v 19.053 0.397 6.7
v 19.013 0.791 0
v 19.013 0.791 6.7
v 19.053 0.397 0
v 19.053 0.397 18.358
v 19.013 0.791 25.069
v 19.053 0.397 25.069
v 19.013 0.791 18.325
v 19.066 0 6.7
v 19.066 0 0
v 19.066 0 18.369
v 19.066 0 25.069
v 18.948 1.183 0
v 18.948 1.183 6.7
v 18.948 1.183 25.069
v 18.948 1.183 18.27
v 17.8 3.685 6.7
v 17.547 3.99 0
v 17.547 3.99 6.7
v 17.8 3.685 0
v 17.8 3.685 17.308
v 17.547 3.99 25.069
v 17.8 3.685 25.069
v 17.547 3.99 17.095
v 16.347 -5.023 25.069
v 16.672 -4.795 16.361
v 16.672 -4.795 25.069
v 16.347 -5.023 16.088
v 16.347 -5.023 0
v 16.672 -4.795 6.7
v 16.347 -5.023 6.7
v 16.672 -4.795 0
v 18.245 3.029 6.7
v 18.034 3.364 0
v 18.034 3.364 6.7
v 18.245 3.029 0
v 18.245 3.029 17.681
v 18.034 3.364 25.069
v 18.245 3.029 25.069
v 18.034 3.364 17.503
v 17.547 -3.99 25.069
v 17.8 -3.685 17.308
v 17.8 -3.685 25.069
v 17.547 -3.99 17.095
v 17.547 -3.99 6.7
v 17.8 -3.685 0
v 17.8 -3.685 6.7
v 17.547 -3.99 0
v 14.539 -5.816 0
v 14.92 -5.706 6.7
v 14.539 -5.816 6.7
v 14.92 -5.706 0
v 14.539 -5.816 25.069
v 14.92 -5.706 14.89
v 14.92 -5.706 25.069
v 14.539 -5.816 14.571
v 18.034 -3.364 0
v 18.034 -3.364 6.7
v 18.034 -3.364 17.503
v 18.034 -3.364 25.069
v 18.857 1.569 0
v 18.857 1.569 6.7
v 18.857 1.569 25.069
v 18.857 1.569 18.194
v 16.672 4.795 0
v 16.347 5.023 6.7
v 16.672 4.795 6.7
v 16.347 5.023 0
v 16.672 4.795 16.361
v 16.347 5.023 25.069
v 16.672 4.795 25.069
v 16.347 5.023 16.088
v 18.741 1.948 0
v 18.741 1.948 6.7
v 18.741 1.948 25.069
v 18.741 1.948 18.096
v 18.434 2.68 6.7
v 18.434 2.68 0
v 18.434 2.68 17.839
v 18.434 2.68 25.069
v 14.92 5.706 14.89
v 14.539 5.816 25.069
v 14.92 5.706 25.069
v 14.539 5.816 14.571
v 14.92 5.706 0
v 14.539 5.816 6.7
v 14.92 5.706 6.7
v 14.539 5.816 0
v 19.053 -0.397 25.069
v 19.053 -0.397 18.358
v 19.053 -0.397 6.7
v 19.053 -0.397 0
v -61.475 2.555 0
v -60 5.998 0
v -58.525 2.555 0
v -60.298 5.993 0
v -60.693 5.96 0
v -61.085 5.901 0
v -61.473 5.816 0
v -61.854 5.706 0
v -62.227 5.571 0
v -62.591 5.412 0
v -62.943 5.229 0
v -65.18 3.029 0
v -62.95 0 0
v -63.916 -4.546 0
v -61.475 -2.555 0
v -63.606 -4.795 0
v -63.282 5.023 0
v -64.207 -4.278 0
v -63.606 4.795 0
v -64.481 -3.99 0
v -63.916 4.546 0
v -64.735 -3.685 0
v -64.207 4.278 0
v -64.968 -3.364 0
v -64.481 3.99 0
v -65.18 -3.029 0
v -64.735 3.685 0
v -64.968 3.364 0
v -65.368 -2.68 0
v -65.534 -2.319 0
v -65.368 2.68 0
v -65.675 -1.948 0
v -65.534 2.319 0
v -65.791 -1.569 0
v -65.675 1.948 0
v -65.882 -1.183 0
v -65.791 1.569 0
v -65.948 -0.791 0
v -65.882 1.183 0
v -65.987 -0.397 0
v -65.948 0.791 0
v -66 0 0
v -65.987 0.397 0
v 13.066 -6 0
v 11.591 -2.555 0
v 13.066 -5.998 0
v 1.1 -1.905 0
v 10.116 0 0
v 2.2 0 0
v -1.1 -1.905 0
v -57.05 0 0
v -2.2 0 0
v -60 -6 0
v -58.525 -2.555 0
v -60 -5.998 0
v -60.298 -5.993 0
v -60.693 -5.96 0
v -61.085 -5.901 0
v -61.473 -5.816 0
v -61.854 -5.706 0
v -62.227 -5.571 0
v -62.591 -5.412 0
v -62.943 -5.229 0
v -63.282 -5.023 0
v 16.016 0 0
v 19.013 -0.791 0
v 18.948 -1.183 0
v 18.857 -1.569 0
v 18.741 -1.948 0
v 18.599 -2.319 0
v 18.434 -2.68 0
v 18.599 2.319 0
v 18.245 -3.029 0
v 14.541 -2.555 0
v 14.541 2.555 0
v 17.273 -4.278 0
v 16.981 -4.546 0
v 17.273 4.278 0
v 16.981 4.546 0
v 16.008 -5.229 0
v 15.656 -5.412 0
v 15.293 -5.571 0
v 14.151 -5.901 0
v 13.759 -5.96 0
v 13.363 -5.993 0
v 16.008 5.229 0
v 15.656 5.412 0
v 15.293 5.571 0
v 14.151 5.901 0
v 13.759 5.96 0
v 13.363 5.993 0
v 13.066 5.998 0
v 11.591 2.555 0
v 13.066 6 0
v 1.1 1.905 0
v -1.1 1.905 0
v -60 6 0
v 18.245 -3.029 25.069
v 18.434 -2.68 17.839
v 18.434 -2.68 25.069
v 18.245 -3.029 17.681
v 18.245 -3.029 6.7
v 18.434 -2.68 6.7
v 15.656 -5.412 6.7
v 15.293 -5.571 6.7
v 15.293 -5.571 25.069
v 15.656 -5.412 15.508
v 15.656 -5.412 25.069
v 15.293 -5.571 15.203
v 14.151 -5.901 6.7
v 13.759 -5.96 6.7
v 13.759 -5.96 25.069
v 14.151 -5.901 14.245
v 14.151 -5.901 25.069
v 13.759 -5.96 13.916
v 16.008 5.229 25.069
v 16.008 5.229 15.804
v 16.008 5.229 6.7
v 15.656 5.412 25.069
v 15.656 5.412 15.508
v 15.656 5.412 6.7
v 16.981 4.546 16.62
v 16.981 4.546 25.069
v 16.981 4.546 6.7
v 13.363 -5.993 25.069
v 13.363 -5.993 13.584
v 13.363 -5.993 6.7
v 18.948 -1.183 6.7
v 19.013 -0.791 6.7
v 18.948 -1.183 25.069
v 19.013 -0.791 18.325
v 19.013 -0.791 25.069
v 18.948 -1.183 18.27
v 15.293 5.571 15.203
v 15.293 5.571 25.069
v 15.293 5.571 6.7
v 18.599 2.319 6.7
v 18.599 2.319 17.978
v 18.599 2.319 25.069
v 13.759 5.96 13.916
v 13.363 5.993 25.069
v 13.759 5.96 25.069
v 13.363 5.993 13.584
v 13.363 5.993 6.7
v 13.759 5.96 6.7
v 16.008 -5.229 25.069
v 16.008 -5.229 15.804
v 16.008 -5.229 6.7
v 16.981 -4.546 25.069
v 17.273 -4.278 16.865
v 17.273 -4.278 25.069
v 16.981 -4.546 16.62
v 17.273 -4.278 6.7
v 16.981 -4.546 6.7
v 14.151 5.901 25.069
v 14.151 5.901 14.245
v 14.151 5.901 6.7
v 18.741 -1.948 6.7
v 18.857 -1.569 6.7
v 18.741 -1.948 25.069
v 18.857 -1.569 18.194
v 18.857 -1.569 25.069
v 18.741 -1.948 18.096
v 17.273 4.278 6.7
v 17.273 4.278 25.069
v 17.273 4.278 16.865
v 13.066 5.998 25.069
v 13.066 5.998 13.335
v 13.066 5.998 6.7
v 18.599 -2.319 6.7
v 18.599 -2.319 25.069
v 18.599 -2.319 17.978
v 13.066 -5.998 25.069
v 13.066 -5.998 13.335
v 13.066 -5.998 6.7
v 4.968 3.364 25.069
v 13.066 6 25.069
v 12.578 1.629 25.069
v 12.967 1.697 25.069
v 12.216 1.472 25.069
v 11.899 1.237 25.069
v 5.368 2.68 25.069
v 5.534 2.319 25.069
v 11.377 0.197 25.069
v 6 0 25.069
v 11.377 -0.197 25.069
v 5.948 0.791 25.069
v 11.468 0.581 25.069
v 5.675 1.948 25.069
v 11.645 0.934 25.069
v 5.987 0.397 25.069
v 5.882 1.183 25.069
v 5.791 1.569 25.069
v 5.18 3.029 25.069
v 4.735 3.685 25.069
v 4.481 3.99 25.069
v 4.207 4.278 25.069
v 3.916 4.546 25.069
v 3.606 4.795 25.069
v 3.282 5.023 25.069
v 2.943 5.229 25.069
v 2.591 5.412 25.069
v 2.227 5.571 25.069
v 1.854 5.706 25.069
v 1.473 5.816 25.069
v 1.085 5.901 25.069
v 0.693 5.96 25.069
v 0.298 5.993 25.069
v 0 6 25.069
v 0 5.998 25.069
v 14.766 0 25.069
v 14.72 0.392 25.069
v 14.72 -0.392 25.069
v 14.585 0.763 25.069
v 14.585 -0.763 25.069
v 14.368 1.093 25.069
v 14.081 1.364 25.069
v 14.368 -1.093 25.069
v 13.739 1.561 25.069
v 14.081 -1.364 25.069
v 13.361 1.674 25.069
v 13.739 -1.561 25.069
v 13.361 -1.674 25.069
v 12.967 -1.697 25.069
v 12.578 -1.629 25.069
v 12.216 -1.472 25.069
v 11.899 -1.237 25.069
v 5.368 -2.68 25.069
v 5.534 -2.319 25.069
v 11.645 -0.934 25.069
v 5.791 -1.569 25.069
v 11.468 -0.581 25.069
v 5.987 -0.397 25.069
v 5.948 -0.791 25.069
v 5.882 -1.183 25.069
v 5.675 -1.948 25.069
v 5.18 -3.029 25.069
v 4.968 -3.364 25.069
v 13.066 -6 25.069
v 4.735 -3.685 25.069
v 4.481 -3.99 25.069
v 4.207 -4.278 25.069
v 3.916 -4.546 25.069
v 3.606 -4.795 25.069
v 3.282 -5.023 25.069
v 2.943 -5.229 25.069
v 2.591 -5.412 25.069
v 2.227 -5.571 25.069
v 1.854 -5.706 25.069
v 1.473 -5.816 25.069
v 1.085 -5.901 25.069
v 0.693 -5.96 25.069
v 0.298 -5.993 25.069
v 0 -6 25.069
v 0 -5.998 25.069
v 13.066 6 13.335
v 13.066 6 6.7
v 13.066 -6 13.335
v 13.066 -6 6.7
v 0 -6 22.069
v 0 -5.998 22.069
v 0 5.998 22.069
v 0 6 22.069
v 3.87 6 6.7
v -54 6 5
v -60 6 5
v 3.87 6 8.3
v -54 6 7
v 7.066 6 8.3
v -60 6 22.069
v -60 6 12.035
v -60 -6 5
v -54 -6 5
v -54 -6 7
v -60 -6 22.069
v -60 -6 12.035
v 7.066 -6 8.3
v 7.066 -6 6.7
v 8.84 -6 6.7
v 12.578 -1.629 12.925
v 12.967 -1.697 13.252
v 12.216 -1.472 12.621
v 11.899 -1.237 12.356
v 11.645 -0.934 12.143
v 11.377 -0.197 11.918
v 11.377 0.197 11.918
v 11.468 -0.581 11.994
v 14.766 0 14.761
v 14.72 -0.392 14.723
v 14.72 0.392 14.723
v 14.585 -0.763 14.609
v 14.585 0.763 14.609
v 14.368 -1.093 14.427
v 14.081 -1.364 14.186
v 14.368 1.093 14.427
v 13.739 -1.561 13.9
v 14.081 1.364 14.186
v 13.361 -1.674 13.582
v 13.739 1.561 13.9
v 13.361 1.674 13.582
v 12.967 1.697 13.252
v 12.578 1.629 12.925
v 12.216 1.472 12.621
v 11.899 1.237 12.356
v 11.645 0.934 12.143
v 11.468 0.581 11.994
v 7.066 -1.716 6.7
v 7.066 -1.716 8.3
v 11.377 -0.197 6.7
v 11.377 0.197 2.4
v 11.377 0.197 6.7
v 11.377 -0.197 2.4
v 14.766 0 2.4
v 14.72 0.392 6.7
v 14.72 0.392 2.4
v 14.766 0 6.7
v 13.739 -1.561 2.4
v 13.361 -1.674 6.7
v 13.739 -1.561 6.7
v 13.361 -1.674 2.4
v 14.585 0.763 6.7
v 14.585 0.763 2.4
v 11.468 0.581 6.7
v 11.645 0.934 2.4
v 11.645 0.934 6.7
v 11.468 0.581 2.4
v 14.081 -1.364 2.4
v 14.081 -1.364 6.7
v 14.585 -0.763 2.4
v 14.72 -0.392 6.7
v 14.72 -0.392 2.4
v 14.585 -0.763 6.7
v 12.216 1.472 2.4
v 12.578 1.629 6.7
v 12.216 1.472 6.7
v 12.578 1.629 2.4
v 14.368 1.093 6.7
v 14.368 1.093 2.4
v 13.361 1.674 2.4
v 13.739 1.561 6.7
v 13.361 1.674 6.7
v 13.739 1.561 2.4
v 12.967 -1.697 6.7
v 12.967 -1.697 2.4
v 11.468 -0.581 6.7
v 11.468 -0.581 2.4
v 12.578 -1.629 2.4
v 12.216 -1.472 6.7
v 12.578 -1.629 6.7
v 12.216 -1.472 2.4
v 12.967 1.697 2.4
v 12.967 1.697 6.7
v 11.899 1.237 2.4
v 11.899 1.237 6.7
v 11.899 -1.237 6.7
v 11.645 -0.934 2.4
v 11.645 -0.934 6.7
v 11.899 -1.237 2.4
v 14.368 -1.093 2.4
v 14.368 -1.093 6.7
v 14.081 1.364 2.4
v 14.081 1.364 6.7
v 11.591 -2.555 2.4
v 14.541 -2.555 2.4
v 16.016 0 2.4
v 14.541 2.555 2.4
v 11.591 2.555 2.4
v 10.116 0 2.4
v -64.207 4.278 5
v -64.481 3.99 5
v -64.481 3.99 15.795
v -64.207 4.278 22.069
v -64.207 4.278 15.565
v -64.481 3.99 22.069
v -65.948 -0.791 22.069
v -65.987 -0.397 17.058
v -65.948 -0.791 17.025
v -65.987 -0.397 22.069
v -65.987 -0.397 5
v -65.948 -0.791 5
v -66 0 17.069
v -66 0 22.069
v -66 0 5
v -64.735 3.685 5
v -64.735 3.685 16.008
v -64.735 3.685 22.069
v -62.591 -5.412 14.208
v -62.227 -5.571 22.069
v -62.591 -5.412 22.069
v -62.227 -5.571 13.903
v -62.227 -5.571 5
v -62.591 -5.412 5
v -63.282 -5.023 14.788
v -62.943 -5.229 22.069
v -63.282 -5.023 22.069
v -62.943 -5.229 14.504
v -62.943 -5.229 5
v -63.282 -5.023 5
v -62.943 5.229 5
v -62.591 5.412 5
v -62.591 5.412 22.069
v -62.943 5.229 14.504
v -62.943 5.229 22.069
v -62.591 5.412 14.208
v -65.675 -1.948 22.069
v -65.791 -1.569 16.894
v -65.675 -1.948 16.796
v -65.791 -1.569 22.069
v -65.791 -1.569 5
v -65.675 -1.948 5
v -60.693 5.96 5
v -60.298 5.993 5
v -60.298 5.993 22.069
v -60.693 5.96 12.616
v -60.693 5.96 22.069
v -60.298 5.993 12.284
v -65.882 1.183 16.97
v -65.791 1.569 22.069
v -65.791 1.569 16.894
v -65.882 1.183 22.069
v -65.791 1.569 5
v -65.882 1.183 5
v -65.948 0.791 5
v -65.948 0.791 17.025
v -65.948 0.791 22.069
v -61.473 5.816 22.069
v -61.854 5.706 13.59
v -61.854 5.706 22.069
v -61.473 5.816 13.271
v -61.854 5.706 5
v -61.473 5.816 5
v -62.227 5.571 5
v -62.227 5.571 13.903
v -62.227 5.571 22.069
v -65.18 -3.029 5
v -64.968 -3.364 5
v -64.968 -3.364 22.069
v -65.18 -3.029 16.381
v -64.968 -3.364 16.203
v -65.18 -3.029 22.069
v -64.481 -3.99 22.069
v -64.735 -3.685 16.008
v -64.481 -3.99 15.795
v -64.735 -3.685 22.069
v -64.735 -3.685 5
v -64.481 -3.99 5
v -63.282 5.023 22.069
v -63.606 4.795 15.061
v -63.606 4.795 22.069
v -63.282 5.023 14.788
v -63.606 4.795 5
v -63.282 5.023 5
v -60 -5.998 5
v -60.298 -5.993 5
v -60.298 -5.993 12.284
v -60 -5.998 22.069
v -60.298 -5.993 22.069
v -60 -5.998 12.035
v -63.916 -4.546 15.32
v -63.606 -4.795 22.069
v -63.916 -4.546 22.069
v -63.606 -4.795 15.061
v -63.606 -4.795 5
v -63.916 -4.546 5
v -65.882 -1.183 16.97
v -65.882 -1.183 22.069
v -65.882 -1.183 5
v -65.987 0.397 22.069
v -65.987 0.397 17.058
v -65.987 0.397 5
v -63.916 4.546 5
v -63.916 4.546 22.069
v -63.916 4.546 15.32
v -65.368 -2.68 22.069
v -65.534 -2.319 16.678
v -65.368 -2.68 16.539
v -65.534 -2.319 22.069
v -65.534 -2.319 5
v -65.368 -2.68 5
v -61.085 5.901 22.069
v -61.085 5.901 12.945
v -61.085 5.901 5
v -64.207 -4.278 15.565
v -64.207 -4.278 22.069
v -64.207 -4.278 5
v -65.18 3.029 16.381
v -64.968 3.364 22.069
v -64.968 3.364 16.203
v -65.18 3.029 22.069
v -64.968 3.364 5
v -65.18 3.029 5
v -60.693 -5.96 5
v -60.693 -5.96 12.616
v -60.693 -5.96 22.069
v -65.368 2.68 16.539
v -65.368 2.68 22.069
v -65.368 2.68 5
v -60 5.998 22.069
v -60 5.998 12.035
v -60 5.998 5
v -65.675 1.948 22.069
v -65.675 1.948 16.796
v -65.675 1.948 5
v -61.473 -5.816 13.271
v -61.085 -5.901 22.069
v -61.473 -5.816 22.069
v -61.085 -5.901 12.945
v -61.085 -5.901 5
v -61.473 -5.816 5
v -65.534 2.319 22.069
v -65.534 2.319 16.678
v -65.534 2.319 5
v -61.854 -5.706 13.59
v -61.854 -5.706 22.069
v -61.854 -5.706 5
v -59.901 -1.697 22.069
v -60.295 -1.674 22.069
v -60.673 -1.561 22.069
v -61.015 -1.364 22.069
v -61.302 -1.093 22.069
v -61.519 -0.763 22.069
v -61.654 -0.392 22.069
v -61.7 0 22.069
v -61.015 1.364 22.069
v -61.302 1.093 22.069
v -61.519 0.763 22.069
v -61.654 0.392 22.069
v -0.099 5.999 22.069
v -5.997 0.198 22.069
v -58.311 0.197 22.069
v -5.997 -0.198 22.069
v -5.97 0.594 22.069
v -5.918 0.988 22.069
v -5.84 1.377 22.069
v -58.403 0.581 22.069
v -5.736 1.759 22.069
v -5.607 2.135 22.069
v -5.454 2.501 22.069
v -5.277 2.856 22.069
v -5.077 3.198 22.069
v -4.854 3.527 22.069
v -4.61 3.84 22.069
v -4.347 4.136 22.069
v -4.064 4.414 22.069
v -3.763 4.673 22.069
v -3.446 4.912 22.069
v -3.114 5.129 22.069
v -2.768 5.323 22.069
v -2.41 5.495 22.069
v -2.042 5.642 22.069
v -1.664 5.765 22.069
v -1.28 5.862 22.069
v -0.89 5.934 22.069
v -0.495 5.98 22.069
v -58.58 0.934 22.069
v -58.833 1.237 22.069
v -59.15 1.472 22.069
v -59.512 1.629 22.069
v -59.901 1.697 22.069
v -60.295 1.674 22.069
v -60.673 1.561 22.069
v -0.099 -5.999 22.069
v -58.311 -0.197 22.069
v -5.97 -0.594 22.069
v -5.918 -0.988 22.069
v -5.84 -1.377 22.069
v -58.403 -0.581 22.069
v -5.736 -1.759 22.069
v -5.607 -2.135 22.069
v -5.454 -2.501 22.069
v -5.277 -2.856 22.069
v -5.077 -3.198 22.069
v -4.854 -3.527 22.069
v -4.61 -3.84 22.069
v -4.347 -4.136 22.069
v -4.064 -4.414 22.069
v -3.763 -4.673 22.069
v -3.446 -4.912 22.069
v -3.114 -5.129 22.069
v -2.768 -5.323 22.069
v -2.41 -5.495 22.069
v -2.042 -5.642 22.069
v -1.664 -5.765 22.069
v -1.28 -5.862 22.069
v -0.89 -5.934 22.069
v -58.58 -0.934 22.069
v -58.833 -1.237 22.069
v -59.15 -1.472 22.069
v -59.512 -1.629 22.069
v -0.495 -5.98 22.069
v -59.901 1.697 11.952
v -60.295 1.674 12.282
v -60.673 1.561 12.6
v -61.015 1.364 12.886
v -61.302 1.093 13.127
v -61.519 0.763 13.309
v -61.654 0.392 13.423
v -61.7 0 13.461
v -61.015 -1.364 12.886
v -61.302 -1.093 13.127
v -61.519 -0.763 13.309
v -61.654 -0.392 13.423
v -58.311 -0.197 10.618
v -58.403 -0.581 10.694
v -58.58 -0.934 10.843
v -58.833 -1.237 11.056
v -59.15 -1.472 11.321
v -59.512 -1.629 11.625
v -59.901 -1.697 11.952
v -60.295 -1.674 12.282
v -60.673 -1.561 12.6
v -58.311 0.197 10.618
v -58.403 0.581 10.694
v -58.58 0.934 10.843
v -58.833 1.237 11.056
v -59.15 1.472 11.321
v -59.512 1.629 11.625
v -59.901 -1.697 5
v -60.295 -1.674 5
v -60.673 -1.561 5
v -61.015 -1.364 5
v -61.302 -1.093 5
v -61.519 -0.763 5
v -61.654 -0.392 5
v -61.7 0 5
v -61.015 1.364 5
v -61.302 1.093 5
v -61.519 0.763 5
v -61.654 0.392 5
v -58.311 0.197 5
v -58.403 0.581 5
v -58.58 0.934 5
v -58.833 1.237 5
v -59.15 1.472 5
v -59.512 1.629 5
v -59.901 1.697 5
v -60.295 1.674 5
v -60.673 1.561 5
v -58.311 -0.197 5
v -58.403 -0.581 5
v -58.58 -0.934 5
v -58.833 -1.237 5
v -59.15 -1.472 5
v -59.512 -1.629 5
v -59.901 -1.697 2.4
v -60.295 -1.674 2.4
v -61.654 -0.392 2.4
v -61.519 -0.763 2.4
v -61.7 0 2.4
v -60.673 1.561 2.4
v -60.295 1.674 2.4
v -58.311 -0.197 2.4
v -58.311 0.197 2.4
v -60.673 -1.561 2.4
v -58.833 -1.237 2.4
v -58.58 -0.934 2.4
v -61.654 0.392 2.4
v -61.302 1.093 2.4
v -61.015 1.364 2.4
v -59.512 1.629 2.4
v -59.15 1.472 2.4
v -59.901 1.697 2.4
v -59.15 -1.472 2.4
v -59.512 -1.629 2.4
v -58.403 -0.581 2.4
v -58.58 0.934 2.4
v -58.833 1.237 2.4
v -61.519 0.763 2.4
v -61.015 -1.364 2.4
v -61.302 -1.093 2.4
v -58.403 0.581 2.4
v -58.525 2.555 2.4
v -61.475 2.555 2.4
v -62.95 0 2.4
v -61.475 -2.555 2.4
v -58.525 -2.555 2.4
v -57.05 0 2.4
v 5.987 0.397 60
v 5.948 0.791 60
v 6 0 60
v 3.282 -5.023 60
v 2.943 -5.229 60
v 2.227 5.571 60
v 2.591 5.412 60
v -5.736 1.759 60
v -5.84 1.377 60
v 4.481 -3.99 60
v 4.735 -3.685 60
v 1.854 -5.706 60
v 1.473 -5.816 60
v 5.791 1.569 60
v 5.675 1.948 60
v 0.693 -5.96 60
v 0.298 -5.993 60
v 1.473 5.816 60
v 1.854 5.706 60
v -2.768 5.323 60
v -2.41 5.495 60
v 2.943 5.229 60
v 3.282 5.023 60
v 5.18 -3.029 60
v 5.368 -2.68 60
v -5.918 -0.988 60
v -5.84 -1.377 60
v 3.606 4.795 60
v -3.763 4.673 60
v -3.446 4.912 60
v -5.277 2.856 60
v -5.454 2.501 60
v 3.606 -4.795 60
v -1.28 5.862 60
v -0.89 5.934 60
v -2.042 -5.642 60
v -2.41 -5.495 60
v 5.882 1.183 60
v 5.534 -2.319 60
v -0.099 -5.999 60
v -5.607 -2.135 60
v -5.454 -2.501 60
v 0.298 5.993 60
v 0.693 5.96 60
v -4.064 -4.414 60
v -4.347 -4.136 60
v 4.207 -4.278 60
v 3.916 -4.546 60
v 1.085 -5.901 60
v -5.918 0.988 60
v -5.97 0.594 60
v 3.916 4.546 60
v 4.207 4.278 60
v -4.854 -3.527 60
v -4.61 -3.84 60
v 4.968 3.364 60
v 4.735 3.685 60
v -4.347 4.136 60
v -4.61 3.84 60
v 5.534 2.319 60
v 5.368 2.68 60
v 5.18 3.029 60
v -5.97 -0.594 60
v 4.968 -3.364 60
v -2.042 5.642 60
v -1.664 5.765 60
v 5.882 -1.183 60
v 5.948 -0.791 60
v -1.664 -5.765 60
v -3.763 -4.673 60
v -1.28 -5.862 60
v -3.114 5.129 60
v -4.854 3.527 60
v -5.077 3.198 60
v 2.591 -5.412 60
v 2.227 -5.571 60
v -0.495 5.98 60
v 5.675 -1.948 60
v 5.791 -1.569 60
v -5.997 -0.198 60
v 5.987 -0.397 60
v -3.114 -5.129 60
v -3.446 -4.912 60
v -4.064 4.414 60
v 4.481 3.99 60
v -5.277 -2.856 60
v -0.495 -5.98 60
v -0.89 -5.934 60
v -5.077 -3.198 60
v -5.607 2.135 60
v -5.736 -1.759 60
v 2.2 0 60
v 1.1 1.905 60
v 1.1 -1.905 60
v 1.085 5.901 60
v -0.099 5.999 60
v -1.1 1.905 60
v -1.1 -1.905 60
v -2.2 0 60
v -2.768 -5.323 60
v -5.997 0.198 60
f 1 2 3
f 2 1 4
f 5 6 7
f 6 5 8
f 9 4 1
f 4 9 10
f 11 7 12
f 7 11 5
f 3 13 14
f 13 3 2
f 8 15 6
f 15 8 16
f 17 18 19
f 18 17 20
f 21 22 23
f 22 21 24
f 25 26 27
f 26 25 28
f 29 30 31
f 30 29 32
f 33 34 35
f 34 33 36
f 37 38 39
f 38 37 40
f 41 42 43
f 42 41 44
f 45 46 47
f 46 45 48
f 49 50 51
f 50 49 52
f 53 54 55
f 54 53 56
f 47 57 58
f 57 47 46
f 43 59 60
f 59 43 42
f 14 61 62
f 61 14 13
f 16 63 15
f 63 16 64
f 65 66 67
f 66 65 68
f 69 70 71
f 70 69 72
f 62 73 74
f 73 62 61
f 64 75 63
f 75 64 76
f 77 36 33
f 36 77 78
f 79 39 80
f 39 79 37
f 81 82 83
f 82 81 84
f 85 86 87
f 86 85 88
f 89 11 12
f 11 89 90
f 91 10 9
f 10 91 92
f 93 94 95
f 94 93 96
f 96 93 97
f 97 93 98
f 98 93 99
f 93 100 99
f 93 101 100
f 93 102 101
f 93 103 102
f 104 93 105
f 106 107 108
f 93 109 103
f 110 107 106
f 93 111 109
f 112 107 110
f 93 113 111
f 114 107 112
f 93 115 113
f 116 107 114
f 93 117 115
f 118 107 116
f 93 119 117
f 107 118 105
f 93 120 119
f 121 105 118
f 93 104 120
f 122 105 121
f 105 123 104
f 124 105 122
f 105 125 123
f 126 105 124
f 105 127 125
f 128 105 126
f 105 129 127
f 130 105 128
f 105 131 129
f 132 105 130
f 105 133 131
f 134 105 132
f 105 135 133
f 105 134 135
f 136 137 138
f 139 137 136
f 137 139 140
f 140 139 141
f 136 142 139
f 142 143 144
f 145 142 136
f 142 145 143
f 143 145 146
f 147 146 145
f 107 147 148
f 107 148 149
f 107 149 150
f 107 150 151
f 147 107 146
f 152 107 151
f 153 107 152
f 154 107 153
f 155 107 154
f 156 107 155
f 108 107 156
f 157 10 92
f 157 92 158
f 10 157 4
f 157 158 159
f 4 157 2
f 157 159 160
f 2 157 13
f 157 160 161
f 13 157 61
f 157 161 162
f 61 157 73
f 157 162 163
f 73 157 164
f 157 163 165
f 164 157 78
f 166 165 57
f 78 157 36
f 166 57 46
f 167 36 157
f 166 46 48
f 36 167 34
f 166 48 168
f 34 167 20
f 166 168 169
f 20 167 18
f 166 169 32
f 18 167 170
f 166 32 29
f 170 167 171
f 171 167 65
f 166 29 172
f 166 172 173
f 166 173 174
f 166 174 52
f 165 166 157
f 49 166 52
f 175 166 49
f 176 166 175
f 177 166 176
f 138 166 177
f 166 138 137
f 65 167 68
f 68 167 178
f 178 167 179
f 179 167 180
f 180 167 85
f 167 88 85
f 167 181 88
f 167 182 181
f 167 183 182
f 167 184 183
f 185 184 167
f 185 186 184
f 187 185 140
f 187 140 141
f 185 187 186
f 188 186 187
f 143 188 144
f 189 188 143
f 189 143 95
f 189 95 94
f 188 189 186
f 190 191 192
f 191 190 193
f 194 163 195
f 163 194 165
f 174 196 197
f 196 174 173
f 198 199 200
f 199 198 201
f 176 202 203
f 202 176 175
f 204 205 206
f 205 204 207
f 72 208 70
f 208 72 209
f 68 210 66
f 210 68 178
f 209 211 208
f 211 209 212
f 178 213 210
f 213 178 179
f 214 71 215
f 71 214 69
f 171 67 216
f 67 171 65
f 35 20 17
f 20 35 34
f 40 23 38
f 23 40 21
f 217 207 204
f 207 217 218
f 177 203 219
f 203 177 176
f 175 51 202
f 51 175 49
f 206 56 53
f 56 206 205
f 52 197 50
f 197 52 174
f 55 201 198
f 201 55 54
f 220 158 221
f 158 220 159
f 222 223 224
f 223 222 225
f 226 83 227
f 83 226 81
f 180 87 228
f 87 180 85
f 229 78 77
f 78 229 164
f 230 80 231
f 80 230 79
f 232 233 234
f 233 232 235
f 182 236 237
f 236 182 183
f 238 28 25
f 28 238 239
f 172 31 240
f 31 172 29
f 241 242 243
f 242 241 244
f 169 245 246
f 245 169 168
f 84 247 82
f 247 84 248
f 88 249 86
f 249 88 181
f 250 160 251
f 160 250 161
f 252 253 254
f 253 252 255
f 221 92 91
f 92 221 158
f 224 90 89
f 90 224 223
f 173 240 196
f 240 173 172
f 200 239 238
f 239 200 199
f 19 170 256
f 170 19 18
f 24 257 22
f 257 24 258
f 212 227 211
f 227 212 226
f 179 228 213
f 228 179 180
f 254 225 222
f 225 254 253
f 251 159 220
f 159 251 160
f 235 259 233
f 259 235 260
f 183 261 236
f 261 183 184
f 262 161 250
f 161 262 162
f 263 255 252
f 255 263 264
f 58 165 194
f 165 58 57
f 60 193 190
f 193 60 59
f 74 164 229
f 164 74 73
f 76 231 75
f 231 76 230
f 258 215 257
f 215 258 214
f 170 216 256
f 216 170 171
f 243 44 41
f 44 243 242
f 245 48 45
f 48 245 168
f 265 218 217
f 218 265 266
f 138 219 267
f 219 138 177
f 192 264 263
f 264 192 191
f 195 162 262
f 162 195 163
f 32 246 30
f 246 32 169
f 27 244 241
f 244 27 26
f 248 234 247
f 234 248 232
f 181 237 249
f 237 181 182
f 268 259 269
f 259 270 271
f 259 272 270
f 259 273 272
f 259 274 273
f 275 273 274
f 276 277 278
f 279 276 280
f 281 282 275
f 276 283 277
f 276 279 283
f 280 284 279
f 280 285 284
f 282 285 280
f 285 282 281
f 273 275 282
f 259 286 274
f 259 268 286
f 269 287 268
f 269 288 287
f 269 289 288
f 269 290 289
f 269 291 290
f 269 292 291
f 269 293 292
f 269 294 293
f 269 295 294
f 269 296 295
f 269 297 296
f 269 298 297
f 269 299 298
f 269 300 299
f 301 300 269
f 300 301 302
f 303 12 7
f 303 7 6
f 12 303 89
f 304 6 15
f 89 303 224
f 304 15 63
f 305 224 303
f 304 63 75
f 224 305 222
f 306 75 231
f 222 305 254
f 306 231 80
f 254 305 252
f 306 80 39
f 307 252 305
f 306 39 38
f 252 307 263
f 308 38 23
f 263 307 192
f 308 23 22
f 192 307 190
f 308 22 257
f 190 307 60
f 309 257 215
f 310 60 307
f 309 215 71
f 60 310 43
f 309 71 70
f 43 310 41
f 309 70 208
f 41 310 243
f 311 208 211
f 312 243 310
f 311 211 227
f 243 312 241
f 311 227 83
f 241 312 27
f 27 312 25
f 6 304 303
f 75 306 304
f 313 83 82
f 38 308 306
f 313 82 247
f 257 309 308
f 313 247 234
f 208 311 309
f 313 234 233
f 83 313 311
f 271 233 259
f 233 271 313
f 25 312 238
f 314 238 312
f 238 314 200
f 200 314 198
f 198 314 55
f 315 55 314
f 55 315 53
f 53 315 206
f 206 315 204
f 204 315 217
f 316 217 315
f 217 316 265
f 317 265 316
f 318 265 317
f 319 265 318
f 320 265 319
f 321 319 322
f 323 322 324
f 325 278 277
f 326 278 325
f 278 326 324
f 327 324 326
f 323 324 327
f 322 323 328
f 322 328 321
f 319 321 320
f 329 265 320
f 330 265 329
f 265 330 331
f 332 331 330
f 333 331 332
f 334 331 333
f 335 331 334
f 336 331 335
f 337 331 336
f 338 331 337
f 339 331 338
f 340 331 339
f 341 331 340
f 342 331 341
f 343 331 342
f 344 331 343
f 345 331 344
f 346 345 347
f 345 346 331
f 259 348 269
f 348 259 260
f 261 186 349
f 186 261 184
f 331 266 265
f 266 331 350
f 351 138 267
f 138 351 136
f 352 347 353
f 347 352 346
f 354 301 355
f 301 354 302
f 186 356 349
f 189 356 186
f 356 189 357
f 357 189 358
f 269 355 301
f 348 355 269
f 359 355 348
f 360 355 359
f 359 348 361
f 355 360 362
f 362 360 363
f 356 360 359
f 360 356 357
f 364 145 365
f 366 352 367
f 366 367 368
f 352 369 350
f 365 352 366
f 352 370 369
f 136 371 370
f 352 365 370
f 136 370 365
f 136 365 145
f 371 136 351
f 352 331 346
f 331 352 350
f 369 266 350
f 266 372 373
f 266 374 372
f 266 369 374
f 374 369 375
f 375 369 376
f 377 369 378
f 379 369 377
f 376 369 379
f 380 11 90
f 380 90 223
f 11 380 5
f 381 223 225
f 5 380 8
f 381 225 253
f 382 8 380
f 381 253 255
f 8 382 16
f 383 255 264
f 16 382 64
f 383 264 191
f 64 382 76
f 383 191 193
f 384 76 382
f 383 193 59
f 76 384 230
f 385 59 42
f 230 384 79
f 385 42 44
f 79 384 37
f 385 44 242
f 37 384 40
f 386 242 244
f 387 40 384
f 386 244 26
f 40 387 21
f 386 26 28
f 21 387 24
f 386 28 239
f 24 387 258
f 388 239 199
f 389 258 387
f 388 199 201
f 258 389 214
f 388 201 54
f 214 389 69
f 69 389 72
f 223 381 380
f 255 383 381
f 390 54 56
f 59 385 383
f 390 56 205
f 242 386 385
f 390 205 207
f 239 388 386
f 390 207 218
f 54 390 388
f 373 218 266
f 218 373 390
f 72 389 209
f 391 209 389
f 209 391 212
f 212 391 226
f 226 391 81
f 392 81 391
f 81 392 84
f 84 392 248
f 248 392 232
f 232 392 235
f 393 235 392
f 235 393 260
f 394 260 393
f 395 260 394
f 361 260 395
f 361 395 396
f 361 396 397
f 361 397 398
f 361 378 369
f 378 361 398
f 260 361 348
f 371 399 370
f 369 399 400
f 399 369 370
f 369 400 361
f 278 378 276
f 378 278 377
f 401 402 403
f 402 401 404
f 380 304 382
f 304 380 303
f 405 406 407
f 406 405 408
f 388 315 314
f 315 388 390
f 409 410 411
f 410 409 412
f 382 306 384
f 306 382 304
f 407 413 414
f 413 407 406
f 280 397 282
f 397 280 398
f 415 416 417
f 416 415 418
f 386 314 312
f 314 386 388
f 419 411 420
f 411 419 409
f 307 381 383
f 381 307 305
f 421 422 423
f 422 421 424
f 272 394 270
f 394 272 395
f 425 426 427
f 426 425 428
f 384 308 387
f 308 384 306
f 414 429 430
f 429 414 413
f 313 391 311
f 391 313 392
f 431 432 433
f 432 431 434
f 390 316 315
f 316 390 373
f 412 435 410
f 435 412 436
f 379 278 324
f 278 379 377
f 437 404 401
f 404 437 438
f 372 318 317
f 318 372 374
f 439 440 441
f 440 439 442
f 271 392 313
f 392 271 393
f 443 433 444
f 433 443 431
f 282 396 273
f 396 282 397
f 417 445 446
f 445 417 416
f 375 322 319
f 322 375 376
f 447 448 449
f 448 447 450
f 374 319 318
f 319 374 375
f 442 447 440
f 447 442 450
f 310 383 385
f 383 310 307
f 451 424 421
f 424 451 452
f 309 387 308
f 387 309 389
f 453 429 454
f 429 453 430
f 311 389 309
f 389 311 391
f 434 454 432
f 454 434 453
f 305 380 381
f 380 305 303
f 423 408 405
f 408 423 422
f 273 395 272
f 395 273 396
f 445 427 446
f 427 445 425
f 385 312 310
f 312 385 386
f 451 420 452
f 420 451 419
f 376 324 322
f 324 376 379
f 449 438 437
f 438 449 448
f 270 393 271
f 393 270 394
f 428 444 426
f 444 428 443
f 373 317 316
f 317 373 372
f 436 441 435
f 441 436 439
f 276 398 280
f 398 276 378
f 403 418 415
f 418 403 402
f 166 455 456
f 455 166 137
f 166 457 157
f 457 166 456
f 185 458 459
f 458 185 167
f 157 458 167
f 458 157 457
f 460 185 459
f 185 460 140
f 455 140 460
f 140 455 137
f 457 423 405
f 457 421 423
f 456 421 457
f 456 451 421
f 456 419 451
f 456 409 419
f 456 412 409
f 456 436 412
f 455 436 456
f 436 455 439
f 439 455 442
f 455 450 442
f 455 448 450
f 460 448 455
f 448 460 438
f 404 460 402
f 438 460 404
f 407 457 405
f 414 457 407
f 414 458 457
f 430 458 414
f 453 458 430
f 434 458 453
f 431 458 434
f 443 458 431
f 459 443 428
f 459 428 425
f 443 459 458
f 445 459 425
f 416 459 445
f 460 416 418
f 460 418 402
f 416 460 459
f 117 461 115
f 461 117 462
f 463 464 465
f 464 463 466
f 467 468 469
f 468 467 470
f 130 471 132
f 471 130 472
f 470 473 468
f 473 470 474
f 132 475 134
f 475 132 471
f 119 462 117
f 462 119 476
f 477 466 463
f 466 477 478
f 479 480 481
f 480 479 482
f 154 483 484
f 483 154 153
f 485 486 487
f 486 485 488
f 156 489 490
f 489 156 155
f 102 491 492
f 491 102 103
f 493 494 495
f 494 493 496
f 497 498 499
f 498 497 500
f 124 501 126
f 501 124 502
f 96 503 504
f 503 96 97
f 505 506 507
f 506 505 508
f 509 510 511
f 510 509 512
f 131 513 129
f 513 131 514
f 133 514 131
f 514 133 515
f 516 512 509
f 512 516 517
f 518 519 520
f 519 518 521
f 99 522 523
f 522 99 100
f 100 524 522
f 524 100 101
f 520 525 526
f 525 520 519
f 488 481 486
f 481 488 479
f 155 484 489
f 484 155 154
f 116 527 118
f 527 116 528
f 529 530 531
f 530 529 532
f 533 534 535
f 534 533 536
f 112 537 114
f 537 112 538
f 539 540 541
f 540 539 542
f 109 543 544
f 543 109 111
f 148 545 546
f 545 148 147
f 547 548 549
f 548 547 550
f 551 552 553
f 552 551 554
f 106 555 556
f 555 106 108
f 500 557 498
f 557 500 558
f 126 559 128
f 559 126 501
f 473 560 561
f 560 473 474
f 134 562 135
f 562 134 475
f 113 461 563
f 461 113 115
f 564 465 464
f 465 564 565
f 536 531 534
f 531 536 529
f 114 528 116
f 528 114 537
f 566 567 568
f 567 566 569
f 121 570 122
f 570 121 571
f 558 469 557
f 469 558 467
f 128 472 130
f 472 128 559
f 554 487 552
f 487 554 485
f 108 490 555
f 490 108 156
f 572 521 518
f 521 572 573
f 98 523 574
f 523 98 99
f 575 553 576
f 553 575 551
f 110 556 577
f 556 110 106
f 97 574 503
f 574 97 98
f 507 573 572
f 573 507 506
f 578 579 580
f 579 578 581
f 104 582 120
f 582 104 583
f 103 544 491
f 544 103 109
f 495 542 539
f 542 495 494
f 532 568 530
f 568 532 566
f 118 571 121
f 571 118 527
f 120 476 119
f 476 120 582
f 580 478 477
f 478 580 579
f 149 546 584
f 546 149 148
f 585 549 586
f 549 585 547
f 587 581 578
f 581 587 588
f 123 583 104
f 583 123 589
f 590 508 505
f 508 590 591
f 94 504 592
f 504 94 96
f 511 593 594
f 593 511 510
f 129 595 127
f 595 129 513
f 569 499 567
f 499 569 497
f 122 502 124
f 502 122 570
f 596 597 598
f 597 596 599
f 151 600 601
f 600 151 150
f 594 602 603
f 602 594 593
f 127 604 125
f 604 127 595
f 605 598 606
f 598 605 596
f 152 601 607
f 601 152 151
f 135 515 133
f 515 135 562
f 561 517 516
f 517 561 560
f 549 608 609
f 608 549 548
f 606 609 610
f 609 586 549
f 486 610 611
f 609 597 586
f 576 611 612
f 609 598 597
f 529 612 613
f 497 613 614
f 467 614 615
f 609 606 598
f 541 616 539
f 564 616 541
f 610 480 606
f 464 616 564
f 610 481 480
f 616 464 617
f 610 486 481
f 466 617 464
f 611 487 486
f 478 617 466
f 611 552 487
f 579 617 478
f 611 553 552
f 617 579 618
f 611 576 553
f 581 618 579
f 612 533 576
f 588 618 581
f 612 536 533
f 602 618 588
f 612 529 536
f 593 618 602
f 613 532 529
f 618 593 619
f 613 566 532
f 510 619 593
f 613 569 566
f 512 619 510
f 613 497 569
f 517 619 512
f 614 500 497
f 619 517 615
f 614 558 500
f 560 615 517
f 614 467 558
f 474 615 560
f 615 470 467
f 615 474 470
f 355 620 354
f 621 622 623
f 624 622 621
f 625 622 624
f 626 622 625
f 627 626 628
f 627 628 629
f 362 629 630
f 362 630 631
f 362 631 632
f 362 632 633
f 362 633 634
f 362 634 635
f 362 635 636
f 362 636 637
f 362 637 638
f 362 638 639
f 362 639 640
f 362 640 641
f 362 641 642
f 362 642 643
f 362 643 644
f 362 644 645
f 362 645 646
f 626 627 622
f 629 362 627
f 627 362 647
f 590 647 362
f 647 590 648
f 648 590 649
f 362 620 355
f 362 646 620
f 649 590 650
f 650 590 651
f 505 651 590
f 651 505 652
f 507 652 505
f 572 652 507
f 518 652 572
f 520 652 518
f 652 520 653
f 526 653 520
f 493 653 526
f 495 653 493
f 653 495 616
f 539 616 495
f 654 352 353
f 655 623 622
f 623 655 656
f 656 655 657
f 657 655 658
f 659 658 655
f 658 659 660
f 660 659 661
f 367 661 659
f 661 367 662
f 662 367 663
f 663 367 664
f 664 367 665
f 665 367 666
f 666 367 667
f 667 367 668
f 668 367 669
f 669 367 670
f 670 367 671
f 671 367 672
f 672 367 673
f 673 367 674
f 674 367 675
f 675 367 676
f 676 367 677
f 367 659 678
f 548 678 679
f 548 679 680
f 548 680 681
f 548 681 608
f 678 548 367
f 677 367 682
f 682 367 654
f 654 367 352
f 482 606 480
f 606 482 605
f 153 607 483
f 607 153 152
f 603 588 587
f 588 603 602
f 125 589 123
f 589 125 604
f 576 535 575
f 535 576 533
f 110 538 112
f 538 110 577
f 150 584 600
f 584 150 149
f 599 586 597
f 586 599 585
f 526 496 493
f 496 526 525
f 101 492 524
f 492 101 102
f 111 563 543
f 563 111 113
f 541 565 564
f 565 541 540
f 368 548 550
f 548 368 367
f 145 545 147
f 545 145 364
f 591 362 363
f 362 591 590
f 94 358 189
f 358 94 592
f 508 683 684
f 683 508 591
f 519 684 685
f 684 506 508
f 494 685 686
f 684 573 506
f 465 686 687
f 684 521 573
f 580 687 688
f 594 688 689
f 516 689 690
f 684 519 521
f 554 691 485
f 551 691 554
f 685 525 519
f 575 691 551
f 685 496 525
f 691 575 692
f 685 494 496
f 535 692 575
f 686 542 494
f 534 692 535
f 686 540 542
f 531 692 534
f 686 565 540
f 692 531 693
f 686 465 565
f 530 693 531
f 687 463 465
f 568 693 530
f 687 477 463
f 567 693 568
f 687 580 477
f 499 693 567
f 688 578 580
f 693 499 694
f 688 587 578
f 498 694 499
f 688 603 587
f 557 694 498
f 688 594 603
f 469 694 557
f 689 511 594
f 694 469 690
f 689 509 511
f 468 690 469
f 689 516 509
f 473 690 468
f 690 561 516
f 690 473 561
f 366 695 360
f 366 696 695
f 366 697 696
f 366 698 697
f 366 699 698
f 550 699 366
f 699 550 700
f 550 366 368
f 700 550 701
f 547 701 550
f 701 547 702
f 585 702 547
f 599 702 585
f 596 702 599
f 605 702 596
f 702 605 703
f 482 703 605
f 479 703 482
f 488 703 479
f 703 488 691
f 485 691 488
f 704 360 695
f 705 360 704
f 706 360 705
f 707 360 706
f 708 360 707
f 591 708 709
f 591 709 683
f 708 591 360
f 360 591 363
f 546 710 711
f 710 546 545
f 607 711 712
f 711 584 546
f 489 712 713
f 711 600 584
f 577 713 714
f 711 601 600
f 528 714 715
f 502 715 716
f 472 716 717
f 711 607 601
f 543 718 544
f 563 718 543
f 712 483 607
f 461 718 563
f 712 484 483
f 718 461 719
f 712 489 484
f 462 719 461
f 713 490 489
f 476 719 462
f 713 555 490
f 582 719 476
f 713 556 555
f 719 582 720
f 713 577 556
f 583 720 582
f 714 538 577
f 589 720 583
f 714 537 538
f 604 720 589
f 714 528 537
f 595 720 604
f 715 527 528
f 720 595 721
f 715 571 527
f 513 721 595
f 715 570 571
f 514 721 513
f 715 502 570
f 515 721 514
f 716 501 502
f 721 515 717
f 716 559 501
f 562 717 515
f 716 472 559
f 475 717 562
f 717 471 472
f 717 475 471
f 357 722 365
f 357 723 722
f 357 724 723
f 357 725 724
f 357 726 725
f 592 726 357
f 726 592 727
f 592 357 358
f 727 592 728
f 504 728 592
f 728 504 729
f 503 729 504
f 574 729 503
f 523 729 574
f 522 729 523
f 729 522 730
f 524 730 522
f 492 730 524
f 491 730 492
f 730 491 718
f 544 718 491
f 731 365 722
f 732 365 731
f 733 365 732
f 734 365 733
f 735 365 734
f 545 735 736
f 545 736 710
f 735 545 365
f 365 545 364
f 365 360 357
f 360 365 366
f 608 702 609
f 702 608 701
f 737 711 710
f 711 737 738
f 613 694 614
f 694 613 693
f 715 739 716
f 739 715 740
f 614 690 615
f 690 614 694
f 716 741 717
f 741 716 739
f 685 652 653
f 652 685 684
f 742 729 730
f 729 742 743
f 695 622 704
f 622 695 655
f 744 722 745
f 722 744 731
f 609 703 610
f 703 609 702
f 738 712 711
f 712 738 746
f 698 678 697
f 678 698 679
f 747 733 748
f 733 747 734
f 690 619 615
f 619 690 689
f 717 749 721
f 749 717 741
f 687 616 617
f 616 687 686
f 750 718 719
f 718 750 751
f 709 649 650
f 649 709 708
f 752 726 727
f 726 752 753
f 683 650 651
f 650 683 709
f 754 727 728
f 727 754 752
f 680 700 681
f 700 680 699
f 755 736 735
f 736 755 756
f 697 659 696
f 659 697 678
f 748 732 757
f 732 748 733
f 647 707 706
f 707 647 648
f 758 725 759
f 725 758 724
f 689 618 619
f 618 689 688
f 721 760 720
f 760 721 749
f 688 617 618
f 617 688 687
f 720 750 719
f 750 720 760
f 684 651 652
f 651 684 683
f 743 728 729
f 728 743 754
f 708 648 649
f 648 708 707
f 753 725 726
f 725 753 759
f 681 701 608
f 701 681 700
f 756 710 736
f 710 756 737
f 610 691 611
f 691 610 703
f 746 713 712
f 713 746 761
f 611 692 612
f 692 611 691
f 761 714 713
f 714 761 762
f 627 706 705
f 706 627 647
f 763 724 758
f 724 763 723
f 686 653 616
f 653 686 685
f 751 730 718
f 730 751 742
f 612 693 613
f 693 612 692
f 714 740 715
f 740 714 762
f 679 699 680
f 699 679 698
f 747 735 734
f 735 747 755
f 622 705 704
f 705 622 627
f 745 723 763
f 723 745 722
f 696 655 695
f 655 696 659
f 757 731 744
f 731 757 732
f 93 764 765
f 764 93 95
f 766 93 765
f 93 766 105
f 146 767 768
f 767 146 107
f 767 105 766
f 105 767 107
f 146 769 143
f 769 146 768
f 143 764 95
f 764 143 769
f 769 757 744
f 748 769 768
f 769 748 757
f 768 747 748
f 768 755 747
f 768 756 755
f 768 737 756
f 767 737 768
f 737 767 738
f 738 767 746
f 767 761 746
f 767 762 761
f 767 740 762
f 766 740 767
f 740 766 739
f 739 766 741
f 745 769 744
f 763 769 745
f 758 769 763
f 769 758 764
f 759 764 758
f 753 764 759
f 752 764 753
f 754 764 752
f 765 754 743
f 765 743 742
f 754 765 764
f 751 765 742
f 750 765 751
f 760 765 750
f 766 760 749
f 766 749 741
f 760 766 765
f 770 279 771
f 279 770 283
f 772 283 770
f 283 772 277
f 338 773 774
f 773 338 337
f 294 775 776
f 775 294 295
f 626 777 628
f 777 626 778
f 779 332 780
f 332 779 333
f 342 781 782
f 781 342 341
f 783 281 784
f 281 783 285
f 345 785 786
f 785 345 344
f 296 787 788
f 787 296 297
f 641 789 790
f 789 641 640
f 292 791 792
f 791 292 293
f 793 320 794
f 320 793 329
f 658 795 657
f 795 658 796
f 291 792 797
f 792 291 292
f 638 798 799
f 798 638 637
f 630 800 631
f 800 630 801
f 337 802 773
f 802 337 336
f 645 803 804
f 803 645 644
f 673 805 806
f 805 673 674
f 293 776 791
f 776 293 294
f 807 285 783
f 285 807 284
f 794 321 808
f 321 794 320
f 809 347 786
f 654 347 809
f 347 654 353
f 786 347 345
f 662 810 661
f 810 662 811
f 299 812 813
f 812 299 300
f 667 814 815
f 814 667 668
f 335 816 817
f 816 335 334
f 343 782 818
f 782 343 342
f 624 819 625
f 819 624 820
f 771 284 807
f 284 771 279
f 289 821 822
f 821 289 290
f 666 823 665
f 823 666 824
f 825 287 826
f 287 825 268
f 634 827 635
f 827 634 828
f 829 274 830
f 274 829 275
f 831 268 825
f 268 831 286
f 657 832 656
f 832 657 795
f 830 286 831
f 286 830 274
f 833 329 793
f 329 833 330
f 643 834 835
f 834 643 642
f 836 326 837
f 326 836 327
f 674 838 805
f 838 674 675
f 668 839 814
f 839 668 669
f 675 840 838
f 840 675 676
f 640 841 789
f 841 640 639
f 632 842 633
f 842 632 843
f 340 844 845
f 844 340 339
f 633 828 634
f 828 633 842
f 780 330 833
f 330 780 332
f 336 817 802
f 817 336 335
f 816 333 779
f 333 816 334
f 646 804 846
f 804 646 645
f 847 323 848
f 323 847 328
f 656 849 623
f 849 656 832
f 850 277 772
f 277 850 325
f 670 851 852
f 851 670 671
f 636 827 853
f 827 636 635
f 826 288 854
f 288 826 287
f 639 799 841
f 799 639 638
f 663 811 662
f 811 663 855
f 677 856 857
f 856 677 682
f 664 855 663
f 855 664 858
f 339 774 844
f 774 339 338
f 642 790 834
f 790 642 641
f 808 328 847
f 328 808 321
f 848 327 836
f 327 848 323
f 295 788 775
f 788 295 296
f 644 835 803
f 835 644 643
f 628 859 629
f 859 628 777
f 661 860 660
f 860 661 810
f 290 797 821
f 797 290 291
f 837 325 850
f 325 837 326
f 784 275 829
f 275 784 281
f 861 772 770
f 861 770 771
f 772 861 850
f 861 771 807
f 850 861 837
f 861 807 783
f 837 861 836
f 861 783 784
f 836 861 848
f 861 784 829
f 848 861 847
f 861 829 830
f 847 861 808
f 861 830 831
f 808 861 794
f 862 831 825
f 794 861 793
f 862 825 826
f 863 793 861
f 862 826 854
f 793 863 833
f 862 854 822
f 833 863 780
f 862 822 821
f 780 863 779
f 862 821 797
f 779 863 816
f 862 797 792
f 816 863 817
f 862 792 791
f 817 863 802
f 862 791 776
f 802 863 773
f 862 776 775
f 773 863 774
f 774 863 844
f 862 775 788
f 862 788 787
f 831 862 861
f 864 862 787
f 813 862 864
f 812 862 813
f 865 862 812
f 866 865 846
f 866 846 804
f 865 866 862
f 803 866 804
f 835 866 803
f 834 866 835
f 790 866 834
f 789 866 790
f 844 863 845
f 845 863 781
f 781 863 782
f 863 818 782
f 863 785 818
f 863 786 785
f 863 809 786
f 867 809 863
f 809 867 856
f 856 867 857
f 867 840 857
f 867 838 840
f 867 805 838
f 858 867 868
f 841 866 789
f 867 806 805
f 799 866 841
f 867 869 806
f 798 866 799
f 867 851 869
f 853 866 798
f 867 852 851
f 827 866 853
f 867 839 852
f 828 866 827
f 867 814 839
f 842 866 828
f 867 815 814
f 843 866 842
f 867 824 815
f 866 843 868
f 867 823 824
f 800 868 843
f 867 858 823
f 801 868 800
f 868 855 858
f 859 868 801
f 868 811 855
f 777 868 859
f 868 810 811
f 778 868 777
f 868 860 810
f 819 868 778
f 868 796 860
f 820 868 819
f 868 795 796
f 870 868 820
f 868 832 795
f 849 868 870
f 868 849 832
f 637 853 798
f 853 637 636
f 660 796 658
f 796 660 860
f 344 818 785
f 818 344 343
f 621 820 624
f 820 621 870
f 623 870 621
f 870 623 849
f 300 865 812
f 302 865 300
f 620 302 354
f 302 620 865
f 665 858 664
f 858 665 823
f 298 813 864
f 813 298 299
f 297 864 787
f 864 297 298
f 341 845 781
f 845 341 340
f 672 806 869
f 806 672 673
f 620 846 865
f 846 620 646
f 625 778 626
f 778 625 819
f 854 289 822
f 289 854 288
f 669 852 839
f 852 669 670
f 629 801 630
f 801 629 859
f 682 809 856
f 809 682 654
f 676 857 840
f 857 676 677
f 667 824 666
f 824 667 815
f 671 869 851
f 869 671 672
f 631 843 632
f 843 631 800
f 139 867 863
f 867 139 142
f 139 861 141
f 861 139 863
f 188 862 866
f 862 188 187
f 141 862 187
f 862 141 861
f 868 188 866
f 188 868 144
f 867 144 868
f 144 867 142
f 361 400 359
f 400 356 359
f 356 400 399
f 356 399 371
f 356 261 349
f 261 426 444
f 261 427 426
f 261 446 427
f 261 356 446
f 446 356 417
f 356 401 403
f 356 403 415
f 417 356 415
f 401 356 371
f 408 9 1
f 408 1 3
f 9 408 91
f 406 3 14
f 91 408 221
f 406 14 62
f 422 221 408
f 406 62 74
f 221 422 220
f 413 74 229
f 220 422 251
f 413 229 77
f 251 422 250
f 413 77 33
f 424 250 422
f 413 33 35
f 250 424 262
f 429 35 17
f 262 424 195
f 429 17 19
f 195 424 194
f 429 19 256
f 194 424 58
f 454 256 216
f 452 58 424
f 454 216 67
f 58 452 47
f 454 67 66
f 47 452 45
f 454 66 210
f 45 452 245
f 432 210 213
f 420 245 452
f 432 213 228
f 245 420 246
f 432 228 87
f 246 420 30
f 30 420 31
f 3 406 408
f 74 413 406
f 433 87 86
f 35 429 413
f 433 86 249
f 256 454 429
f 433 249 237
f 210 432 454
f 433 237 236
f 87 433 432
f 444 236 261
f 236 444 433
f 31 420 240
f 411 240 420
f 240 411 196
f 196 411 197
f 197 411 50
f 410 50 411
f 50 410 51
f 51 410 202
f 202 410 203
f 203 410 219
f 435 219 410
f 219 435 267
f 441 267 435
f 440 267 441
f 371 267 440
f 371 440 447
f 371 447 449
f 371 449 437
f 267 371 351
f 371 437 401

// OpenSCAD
//Physical dimensions.
printing_play = 0.2;
printing_overhang = 50; //Maximum overhang angle. 90 is perfect bridging. 0 is no overhang possible.
flipper_solenoid_pinhole_position = 2.5;
flipper_solenoid_pin_retracted = 8.5; //Length when retracted.
flipper_solenoid_pin_expansion = 10; //Stroke length.
flipper_solenoid_pin_radius = 2;
flipper_solenoid_height = 15;
flipper_solenoid_pingap_thickness = 1.6;
hexkey_radius = 2; //Radius of circumscribed circle around hex key.
m3_bolt_radius = 1.5;
m3_nut_radius = 5.5 / 2;
m3_nut_height = 2.4;
spring_end_thickness = 2; //How thick the attachment part of the spring is.

//Preference settings.
grip_length = 60;
radius = flipper_solenoid_pin_retracted - flipper_solenoid_pinhole_position;
spring_arm = 60; //How far the spring must be from the centre of rotation.
spring_min_thickness = 5; //How thick to make the handles above and below the spring.
flipper_rotation_angle = 45; //Degrees rotation when activated.
$fs = 0.4;
$fa = 1;

//Calculations.
solenoid_arm = flipper_solenoid_pin_expansion / 2 / sin(flipper_rotation_angle / 2);
around_pin = flipper_solenoid_height / 2 - flipper_solenoid_pin_radius;

module attachment(arm, min_thickness, spacing) {
	difference() {
		arm_height = min_thickness * 2 + spacing + tan(90 - printing_overhang) * radius * 2;
		union() { //Body of arm.
			translate([arm, 0, 0]) {
				cylinder(r=radius, h=arm_height);
			}
			translate([0, -radius, 0]) {
				cube([arm, radius * 2, arm_height]);
			}
		}
		translate([arm - radius, -radius, min_thickness]) { //Gap to fit the attachment.
			cube([radius * 2, radius * 2, spacing]);
			diagonal = radius * 2 / cos(printing_overhang);
			intersection() { //Making this end printable.
				translate([0, 0, spacing]) {
					rotate([0, printing_overhang, 0]) {
						cube([radius * 2 / cos(printing_overhang), radius * 2, arm_height]);
					}
				}
				cube([radius * 2, radius * 2, arm_height]);
			}
		}
		cylinder($fn=6, r=hexkey_radius + printing_play, h=arm_height); //Overlap with main hex key.
		translate([arm, 0, 0]) {
			cylinder(r=m3_bolt_radius + printing_play, h=arm_height); //Putting a bolt here to attach it.
			cylinder($fn=6, r=m3_nut_radius + printing_play, h=m3_nut_height); //Leave space for nut.
		}
	}
}

module flipper_grip() {
	solenoid_min_thickness = flipper_solenoid_height / 2 - flipper_solenoid_pingap_thickness / 2;
	difference() {
		union() {
			cylinder(r=radius, h=grip_length); //Main body.
			attachment(solenoid_arm, solenoid_min_thickness, flipper_solenoid_pingap_thickness);
			rotate([0, 0, 180]) {
				attachment(spring_arm, spring_min_thickness, spring_end_thickness);
			}
		}
		cylinder($fn=6, r=hexkey_radius + printing_play, h=grip_length); //Slot for hex key.
		translate([solenoid_arm, 0, solenoid_min_thickness]) {
			rotate([0, 0, flipper_rotation_angle / 2]) {
				translate([-radius - printing_play, -radius - printing_play, 0]) {
					cube([(radius + printing_play) * 2, 99999999, flipper_solenoid_pingap_thickness]);
				}
			}
		}
	}
}

flipper_grip();
